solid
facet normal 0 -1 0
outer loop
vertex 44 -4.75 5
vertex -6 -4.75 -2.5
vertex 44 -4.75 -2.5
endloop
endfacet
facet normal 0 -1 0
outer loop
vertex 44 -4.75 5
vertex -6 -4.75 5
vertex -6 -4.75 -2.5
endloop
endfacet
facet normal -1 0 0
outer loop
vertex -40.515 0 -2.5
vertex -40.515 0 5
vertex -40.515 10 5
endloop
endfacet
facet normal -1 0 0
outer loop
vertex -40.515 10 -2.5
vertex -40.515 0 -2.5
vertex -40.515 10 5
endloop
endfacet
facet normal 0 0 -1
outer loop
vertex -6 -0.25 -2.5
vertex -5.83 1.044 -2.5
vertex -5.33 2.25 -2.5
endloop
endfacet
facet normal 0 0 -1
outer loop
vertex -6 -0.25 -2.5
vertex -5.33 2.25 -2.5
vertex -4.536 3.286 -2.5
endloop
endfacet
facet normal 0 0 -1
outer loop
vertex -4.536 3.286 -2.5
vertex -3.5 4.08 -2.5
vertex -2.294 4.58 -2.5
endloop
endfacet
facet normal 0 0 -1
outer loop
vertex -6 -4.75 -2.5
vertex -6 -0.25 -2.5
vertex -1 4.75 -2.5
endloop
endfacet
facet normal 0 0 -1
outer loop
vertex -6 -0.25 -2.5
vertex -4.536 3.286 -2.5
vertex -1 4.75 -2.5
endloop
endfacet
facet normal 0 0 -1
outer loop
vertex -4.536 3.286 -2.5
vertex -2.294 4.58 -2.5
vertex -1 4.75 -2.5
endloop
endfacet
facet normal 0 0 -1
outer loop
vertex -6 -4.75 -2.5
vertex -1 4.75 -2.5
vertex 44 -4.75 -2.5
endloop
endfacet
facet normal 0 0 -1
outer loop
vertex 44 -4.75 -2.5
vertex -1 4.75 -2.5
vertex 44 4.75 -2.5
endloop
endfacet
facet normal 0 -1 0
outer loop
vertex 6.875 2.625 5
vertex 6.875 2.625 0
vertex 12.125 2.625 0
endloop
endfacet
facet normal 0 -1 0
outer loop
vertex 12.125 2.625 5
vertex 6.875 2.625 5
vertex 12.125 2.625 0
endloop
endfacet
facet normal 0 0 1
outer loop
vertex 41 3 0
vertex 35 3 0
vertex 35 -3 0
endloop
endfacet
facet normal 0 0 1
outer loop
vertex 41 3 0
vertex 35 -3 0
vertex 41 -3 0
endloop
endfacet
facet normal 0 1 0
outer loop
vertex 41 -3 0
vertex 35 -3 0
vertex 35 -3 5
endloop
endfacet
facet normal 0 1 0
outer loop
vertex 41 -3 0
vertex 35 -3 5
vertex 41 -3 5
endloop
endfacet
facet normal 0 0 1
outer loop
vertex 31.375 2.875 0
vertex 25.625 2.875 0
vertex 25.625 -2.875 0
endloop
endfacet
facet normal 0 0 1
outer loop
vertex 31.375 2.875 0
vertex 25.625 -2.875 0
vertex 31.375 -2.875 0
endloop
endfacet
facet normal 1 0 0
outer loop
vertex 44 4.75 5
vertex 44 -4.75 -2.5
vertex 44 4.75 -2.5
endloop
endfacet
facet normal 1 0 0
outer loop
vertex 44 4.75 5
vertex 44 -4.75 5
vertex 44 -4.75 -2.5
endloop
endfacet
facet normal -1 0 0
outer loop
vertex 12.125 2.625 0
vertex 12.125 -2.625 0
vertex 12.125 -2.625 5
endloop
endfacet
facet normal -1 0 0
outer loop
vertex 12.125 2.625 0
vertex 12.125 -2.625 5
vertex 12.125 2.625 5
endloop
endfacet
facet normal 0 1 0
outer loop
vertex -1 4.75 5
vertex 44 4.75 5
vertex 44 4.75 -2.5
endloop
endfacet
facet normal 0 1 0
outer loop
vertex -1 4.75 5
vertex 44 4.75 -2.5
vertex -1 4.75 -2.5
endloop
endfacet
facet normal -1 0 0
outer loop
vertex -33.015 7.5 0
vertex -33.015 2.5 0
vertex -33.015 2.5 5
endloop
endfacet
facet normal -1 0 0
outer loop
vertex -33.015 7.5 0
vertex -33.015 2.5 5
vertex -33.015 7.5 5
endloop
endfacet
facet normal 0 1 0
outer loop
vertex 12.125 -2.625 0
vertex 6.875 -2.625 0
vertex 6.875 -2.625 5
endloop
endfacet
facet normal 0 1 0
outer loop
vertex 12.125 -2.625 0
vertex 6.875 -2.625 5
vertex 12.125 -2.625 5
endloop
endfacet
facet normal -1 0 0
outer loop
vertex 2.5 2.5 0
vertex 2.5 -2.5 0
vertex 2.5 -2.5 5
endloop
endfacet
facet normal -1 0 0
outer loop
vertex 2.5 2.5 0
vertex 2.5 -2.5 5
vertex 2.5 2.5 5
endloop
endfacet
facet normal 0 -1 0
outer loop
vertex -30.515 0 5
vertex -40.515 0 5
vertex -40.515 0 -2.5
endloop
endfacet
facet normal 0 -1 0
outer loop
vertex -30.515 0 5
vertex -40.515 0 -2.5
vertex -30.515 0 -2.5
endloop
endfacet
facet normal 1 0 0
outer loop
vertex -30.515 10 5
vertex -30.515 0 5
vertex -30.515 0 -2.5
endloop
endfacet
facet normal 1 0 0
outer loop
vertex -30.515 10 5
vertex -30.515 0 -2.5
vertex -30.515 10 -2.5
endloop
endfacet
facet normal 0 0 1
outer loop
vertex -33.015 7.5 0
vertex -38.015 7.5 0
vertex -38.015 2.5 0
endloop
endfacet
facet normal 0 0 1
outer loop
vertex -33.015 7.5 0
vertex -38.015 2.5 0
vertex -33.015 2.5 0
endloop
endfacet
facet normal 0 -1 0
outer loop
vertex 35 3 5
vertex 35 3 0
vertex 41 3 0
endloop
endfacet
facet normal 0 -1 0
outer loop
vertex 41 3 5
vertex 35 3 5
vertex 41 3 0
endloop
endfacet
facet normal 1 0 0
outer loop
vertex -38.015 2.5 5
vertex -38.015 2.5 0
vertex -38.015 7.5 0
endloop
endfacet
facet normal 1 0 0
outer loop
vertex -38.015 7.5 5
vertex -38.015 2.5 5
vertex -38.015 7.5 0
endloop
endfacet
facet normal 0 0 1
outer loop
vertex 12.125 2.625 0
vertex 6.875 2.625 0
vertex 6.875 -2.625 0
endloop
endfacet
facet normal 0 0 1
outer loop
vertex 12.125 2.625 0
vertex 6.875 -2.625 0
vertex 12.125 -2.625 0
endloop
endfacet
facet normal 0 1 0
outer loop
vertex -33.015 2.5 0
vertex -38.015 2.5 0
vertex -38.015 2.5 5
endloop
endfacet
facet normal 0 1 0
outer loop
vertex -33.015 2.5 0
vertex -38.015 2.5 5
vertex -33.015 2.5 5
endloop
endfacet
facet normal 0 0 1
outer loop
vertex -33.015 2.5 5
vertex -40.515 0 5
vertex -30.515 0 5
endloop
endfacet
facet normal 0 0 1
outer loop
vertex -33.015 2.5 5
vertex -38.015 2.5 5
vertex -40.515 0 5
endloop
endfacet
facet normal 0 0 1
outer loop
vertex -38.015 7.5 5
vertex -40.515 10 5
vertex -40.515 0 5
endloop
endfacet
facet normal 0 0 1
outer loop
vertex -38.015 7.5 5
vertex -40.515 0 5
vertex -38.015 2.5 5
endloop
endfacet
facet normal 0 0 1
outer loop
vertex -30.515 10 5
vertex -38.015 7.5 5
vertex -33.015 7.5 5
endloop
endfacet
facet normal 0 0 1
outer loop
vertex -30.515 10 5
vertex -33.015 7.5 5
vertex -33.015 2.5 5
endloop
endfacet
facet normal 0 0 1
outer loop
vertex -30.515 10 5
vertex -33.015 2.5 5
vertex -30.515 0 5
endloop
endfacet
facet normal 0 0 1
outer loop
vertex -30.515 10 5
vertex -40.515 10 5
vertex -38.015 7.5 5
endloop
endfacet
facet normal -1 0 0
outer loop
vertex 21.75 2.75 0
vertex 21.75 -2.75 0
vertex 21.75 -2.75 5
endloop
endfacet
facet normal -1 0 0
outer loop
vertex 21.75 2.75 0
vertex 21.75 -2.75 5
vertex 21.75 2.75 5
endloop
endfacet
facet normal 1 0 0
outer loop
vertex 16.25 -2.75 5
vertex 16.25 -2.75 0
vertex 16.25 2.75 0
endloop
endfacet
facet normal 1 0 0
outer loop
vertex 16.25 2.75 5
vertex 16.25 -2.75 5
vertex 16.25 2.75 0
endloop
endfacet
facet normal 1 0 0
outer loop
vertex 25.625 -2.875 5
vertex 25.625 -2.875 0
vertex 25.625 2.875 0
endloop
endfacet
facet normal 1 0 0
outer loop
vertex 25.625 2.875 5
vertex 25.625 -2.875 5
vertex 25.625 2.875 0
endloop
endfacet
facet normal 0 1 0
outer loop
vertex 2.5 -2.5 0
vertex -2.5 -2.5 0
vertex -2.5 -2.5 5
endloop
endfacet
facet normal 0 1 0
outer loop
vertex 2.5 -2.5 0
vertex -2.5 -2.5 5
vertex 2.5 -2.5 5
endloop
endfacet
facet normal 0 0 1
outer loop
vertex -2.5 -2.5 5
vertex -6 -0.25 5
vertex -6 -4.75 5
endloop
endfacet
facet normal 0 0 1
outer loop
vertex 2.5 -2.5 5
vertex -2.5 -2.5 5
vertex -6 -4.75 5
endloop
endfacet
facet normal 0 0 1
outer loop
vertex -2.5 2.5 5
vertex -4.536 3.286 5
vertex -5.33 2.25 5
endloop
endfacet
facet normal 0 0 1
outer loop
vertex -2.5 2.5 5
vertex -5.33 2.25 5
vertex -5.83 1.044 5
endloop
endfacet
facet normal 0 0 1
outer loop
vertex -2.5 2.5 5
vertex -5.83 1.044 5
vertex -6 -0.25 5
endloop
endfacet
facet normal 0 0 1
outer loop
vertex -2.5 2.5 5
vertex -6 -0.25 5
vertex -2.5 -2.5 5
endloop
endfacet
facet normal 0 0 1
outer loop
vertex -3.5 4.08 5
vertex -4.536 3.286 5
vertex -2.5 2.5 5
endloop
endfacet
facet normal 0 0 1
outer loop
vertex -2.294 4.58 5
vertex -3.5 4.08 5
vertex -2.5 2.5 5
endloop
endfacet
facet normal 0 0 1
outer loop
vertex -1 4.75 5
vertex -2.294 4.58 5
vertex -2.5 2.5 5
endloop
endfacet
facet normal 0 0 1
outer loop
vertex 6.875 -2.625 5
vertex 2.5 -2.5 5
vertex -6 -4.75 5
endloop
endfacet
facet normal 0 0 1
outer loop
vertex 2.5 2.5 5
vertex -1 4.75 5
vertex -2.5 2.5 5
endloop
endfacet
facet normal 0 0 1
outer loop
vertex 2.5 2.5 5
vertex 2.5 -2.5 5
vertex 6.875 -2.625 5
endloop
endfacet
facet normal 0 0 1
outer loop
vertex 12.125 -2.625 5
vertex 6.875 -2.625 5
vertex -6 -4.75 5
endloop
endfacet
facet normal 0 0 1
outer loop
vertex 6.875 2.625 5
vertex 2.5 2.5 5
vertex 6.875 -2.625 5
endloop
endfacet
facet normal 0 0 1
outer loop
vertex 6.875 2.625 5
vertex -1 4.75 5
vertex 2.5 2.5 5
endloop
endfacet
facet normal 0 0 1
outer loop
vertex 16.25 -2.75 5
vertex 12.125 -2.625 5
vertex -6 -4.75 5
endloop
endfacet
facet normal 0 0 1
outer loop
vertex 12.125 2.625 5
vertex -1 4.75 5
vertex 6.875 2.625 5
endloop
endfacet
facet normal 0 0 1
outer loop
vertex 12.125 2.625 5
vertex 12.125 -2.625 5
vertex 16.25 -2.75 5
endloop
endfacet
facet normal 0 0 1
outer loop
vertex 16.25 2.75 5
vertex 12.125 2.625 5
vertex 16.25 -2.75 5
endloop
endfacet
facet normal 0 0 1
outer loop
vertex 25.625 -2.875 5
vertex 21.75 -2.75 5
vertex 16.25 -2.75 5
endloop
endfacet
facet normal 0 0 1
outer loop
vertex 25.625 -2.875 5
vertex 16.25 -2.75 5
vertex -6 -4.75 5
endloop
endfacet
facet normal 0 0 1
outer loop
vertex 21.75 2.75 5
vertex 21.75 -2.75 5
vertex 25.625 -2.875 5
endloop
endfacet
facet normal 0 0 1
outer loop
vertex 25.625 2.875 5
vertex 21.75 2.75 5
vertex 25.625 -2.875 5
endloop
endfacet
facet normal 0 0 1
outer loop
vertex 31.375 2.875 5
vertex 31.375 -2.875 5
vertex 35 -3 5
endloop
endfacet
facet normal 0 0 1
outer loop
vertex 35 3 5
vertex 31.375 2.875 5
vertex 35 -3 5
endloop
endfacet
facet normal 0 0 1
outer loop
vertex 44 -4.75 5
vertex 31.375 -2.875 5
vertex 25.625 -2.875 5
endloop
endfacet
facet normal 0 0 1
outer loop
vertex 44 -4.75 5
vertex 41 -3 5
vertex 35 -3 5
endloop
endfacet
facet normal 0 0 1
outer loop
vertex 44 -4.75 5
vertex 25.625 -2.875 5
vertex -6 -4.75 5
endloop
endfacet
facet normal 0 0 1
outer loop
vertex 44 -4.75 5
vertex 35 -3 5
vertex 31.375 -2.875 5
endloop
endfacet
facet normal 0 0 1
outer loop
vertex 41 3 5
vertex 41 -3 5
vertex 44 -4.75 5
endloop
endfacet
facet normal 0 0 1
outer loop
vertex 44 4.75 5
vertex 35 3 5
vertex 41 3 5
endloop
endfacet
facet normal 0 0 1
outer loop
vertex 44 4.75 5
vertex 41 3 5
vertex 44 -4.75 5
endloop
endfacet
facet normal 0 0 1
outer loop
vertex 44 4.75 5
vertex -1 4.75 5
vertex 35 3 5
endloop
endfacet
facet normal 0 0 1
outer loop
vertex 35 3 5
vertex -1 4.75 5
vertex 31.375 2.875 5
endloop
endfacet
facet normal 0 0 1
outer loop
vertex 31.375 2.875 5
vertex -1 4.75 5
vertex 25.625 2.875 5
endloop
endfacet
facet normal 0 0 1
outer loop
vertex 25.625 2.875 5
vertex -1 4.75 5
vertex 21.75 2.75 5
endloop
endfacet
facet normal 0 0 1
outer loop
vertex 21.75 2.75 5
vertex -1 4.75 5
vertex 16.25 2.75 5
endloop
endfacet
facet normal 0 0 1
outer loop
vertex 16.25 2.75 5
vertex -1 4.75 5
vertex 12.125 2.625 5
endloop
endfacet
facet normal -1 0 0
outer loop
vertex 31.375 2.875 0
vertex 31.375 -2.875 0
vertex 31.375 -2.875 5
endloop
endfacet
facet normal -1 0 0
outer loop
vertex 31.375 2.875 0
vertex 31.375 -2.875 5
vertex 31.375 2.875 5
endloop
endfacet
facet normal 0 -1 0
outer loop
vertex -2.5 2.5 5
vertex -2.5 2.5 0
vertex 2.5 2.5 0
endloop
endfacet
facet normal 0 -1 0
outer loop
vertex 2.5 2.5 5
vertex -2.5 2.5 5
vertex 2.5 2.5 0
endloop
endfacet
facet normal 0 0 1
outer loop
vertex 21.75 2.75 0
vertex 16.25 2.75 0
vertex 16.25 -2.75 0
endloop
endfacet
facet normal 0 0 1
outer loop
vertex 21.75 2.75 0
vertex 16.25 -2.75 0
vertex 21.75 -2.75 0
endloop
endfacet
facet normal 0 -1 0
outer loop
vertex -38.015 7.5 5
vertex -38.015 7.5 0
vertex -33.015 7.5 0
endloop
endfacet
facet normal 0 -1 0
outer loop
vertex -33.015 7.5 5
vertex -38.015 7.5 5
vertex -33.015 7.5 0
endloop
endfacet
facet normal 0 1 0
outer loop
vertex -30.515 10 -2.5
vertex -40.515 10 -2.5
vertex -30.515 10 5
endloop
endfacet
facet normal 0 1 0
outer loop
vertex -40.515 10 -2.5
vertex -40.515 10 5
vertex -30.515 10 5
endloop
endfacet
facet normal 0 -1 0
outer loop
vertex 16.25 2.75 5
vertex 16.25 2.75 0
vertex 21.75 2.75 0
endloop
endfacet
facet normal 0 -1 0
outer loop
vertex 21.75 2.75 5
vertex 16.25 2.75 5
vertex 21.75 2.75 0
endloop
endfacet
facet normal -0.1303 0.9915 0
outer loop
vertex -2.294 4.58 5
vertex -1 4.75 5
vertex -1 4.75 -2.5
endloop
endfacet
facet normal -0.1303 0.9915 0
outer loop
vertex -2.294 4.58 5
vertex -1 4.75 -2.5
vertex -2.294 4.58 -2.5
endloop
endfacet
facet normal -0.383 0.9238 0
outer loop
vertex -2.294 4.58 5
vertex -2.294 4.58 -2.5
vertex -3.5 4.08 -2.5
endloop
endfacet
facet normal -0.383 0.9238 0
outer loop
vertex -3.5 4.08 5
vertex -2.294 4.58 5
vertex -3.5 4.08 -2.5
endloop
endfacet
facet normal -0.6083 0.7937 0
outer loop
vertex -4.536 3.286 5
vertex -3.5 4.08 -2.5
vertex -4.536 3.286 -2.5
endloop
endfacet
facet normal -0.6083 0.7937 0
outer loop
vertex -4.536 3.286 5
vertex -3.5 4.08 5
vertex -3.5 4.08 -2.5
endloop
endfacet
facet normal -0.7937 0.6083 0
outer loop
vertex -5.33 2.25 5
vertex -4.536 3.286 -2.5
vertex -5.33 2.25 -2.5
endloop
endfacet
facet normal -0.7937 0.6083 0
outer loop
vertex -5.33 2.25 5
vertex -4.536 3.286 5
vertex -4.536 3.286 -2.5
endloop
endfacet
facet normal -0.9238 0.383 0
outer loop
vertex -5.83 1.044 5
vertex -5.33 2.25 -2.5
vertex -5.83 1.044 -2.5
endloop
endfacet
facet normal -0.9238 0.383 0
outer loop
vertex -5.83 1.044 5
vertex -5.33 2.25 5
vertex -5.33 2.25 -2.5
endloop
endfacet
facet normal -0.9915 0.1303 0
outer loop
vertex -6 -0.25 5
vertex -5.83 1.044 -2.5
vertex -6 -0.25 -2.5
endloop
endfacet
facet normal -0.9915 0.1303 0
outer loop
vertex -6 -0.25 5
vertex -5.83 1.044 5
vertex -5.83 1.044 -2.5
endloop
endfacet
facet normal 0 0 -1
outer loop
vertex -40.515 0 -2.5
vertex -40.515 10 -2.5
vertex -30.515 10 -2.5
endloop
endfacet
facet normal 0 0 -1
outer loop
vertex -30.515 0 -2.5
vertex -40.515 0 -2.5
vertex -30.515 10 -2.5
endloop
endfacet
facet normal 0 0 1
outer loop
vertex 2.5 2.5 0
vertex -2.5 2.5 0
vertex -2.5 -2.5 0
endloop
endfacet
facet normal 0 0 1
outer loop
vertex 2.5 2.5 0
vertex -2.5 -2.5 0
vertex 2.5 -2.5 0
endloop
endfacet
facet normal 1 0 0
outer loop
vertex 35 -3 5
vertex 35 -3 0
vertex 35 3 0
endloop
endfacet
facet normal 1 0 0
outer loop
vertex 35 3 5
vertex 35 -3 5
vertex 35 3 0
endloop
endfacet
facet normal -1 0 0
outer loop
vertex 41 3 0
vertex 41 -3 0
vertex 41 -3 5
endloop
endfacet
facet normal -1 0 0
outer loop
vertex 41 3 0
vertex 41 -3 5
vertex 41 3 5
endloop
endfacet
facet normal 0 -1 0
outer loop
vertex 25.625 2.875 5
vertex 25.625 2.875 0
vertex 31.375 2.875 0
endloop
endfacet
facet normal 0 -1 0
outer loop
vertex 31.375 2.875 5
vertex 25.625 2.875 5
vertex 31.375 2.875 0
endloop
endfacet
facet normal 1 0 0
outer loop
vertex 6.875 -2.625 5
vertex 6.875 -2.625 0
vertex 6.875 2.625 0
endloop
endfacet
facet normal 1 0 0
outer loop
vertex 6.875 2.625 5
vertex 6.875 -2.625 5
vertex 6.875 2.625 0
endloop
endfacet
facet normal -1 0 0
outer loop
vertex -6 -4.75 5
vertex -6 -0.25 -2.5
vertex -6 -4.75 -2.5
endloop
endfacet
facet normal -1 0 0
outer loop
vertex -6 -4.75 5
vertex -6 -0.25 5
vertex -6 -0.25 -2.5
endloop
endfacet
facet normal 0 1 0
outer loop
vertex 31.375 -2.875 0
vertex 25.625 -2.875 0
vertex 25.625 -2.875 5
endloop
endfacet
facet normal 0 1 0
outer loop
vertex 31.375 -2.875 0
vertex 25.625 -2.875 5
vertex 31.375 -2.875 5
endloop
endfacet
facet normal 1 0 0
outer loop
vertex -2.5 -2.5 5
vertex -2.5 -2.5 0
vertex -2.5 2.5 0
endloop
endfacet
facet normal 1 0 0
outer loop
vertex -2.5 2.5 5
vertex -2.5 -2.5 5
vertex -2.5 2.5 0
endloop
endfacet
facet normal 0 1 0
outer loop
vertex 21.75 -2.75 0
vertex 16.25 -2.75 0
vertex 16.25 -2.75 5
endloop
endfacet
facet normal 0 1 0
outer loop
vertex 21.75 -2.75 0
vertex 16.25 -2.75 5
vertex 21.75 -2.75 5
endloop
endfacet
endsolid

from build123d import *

# Parameters (mm, degrees)
F0_W     = 5
F0_H     = 5
F0_W_2   = 5.25
F0_H_2   = 5.25
F0_W_3   = 5.5
F0_H_3   = 5.5
F0_W_4   = 5.75
F0_H_4   = 5.75
F0_W_5   = 6
F0_H_5   = 6
F1_DEPTH = 5
F2_DEPTH = 2.5
F3_W     = 10
F3_H     = 10
F3_W_2   = 5
F3_H_2   = 5
F4_DEPTH = 5
F5_DEPTH = 2.5


with BuildPart() as f1:
    # F0 (on Top) → F1 (new body)
    with BuildSketch(Plane.XY):
        with BuildLine():
            Line((44, -4.75), (44, 4.75))
            Line((44, 4.75), (-1, 4.75))
            ThreePointArc((-1, 4.75), (-4.5355339059, 3.2855339059), (-6, -0.25))
            Line((-6, -0.25), (-6, -4.75))
            Line((-6, -4.75), (44, -4.75))
        make_face()
        Rectangle(F0_W, F0_H, mode=Mode.SUBTRACT)
        with Locations((9.5, 0)):
            Rectangle(F0_W_2, F0_H_2, mode=Mode.SUBTRACT)
        with Locations((19, 0)):
            Rectangle(F0_W_3, F0_H_3, mode=Mode.SUBTRACT)
        with Locations((28.5, 0)):
            Rectangle(F0_W_4, F0_H_4, mode=Mode.SUBTRACT)
        with Locations((38, 0)):
            Rectangle(F0_W_5, F0_H_5, mode=Mode.SUBTRACT)
    extrude(amount=F1_DEPTH)

    # F0 (on Top) → F2 (join)
    with BuildSketch(Plane.XY):
        with BuildLine():
            Line((44, -4.75), (44, 4.75))
            Line((44, 4.75), (-1, 4.75))
            ThreePointArc((-1, 4.75), (-4.5355339059, 3.2855339059), (-6, -0.25))
            Line((-6, -0.25), (-6, -4.75))
            Line((-6, -4.75), (44, -4.75))
        make_face()
        Rectangle(F0_W, F0_H, mode=Mode.SUBTRACT)
        with Locations((9.5, 0)):
            Rectangle(F0_W_2, F0_H_2, mode=Mode.SUBTRACT)
        with Locations((19, 0)):
            Rectangle(F0_W_3, F0_H_3, mode=Mode.SUBTRACT)
        with Locations((28.5, 0)):
            Rectangle(F0_W_4, F0_H_4, mode=Mode.SUBTRACT)
        with Locations((38, 0)):
            Rectangle(F0_W_5, F0_H_5, mode=Mode.SUBTRACT)
        with Locations((38, 0)):
            Rectangle(F0_W_5, F0_H_5)
        with Locations((28.5, 0)):
            Rectangle(F0_W_4, F0_H_4)
        with Locations((19, 0)):
            Rectangle(F0_W_3, F0_H_3)
        with Locations((9.5, 0)):
            Rectangle(F0_W_2, F0_H_2)
        Rectangle(F0_W, F0_H)
    extrude(amount=-F2_DEPTH)


with BuildPart() as f4:
    # F3 (on Top) → F4 (new body)
    with BuildSketch(Plane.XY):
        with Locations((-35.5154023, 5)):
            Rectangle(F3_W, F3_H)
        with Locations((-35.5154023, 5)):
            Rectangle(F3_W_2, F3_H_2, mode=Mode.SUBTRACT)
    extrude(amount=F4_DEPTH)

    # F3 (on Top) → F5 (join)
    with BuildSketch(Plane.XY):
        with Locations((-35.5154023, 5)):
            Rectangle(F3_W, F3_H)
        with Locations((-35.5154023, 5)):
            Rectangle(F3_W_2, F3_H_2, mode=Mode.SUBTRACT)
        with Locations((-35.5154023, 5)):
            Rectangle(F3_W_2, F3_H_2)
    extrude(amount=-F5_DEPTH)


solid = Compound([f1.part, f4.part])
